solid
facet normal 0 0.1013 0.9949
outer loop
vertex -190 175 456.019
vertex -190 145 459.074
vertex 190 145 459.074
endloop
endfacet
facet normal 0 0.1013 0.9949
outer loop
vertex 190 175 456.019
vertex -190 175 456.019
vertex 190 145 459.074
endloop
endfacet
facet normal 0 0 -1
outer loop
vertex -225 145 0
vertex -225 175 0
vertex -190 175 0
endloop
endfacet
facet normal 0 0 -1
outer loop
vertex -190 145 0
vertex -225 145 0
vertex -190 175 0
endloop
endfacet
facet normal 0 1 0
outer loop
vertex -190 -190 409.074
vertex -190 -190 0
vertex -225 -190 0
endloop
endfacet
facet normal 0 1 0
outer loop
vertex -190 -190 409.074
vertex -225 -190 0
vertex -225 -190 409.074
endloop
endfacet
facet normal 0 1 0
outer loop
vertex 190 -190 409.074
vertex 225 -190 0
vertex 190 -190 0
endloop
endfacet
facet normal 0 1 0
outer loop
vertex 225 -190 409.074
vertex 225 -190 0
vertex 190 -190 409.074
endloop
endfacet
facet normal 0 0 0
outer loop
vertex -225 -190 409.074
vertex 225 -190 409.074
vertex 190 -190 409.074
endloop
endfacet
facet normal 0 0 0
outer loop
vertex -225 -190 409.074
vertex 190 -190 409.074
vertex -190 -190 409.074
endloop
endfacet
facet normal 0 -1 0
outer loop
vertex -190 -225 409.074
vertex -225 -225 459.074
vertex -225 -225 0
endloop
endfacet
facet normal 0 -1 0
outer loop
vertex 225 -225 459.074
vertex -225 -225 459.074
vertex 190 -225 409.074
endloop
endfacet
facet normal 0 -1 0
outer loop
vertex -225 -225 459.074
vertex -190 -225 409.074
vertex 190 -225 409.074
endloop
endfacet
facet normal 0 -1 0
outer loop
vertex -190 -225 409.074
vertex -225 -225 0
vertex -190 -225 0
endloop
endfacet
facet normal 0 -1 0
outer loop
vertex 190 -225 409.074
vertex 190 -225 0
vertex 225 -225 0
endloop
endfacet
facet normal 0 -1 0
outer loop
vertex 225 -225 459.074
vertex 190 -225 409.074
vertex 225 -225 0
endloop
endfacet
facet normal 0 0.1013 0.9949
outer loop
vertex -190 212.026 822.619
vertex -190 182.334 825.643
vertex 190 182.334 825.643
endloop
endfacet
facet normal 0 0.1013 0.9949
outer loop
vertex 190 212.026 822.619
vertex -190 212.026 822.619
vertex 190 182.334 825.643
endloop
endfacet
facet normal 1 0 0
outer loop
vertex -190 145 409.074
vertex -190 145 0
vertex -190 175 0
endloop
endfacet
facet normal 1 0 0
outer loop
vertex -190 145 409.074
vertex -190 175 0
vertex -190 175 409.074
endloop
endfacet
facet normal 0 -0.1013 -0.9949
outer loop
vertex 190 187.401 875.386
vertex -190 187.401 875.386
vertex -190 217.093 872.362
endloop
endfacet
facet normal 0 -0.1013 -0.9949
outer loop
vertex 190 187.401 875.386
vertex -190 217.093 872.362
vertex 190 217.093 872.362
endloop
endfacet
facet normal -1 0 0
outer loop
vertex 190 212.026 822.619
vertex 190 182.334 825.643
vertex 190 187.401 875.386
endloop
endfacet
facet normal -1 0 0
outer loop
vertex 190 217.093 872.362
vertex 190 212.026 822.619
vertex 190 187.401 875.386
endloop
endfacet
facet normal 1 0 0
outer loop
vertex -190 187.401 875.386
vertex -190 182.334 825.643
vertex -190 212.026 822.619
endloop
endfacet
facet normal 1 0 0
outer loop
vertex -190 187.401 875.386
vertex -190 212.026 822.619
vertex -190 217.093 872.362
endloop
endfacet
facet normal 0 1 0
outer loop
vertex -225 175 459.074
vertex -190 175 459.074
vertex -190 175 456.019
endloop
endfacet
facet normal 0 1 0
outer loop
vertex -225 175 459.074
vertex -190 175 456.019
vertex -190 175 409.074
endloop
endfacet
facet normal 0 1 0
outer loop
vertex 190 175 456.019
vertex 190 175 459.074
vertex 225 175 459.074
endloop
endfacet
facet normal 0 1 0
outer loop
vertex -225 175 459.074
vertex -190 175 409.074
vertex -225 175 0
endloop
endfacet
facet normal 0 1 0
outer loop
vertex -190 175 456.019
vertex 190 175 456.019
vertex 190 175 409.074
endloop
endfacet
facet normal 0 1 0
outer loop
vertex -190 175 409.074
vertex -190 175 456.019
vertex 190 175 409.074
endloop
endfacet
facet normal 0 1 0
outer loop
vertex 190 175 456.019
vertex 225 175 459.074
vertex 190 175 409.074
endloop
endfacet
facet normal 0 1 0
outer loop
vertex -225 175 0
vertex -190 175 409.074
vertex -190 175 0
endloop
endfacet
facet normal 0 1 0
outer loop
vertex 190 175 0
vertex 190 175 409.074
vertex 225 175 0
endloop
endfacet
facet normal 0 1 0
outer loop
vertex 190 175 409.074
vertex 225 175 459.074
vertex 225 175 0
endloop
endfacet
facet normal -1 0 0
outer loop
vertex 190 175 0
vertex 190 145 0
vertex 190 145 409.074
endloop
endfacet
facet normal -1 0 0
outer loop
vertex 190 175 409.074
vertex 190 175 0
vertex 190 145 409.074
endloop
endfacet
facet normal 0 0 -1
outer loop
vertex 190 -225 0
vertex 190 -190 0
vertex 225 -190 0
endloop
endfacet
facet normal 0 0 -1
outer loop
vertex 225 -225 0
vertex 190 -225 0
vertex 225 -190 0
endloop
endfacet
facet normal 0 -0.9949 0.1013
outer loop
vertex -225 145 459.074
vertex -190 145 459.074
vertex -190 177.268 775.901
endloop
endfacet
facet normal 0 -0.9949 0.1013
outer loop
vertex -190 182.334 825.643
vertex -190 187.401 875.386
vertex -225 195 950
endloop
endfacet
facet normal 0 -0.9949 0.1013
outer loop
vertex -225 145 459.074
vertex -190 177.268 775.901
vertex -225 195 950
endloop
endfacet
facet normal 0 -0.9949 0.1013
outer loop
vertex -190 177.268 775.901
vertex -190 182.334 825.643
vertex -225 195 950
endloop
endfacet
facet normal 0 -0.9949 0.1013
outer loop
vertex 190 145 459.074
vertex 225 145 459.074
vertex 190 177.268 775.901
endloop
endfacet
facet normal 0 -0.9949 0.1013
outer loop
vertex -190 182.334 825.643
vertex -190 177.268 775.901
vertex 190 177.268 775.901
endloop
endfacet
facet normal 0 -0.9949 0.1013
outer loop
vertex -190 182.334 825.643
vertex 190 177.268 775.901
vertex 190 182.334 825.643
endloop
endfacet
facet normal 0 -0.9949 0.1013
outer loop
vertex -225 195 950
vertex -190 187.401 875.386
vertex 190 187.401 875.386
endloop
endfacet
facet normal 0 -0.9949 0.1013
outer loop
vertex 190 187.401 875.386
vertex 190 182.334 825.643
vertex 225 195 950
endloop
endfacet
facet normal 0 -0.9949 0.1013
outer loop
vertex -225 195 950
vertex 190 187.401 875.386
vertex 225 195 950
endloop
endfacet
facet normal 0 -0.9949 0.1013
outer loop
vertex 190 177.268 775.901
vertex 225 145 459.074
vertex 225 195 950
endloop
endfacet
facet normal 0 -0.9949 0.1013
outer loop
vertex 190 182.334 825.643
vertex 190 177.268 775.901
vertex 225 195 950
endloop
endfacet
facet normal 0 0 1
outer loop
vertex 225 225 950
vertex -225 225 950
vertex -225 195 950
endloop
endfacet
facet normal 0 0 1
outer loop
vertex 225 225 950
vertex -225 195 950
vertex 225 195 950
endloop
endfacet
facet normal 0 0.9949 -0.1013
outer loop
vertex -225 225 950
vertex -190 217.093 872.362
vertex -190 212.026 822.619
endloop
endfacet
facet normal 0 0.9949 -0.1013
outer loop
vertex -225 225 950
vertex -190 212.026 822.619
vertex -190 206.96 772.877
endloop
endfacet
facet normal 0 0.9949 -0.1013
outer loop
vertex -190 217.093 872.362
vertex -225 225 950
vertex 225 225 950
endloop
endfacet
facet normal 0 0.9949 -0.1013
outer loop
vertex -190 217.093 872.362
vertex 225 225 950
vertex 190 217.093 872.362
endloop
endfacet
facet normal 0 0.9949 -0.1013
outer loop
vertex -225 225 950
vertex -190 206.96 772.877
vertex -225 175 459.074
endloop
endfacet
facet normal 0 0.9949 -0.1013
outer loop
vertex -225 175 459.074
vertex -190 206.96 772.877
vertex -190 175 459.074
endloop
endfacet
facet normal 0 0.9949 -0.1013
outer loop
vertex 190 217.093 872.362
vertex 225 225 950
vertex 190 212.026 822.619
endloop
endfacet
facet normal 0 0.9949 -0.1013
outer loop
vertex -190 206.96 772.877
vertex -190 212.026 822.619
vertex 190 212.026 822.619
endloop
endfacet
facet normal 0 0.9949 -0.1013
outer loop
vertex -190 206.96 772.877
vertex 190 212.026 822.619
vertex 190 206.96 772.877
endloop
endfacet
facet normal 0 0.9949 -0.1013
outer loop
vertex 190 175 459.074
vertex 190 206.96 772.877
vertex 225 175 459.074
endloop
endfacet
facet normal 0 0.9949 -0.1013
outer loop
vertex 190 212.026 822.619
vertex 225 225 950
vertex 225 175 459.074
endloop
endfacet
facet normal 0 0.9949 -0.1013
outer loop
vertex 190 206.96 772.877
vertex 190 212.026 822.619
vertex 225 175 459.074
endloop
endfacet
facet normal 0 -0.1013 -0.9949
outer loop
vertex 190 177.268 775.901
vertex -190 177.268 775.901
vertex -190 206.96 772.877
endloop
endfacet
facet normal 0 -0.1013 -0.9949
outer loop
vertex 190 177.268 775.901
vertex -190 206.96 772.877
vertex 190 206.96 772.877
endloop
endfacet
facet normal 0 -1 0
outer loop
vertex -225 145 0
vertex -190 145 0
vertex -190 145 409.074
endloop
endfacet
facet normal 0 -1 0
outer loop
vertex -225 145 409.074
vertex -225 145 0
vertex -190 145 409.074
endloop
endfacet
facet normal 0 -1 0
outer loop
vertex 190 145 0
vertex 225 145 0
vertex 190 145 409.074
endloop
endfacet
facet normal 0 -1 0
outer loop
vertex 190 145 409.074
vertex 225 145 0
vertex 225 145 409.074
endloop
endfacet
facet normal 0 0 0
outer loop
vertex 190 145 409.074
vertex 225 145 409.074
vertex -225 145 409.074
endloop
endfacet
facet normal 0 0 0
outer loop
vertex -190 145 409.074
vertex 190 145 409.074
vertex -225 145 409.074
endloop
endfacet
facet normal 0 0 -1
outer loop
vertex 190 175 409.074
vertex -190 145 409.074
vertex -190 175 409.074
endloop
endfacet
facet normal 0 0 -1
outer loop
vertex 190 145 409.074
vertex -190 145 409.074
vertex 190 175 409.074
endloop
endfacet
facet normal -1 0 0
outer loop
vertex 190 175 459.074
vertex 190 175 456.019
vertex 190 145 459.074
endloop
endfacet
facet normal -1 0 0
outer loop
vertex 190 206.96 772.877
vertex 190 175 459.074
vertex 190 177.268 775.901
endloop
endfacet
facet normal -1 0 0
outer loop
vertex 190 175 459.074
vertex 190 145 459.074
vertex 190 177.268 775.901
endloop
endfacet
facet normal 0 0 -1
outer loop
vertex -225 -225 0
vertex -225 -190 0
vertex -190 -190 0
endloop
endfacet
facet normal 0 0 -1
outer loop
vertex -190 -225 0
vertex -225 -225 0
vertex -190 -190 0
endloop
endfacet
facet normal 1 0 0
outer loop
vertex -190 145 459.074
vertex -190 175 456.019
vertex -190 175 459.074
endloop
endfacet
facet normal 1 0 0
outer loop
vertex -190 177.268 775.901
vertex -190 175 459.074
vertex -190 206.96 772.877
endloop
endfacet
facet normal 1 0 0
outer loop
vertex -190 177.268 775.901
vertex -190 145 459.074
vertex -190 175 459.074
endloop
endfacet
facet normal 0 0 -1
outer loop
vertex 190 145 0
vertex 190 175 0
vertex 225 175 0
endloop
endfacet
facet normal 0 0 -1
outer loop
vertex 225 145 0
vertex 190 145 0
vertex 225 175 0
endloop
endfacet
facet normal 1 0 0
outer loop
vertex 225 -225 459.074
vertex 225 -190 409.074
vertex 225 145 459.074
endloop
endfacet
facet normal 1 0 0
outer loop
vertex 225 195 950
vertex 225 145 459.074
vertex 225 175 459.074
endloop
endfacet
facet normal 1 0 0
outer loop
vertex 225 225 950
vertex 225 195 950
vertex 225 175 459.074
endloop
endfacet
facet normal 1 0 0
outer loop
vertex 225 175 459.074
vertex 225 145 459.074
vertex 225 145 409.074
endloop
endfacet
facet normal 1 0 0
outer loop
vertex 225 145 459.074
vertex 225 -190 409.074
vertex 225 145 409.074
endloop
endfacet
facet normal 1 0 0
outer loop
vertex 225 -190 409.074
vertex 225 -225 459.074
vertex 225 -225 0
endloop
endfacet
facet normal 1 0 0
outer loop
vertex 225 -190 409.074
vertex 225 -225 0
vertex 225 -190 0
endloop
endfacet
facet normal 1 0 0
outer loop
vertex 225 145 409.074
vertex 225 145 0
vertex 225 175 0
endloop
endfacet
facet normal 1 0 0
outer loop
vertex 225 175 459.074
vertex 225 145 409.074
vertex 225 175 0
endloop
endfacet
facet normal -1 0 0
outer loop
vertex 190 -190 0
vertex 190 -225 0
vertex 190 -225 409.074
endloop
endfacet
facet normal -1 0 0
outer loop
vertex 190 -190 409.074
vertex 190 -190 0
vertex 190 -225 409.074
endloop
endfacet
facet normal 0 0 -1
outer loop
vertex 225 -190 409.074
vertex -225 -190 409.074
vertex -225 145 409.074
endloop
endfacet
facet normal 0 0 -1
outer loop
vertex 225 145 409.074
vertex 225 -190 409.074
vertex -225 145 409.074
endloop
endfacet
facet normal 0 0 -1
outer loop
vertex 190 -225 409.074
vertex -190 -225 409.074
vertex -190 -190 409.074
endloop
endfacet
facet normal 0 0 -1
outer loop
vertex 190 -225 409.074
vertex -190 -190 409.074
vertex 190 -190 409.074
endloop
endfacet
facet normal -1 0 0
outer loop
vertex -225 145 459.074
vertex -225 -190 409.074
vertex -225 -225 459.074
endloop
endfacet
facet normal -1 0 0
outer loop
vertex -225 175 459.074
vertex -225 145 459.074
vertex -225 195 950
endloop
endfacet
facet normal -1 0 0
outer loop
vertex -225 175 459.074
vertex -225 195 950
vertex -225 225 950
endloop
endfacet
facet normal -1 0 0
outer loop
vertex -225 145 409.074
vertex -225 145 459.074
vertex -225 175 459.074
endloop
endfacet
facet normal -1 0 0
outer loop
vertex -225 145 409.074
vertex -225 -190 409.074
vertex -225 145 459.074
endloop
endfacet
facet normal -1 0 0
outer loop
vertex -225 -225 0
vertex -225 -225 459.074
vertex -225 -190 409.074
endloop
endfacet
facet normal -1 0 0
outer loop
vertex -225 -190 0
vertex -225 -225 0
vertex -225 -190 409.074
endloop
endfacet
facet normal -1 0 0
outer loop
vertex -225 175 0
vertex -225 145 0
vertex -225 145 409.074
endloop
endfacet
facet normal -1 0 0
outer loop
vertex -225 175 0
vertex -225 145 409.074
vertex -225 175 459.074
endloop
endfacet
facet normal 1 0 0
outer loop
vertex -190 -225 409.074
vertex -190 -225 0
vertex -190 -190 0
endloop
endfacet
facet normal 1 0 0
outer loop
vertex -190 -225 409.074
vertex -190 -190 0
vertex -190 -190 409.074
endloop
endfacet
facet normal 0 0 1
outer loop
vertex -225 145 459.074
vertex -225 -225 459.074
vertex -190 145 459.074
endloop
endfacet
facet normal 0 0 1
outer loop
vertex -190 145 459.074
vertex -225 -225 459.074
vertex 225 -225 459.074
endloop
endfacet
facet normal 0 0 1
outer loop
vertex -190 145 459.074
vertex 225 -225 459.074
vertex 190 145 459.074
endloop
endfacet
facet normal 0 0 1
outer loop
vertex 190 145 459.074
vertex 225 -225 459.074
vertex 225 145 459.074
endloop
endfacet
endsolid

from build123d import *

# Parameters (mm, degrees)
F0_W     = 450
F0_H     = 450
F1_DEPTH = 950
F2_W     = 50
F2_H     = 409.0744554996
F2_W_2   = 335
F2_H_2   = 50
F3_DEPTH = 450.001
F4_W     = 380
F4_H     = 409.074
F5_DEPTH = 450.001
F6_W     = 380
F6_H     = 50
F6_H_2   = 318.4651864549
F7_DEPTH = 126.1046604873


with BuildPart() as f1:
    # F0 (on Top) → F1 (new body)
    with BuildSketch(Plane.XY):
        Rectangle(F0_W, F0_H)
    extrude(amount=F1_DEPTH)

    # F2 (on face) → F3 (cut, through all)
    with BuildSketch(Plane.YZ.offset(225)):
        Polygon((225, 950), (175, 459.0744554996), (225, 459.0744554996), align=None)
        Polygon((-225, 950), (-225, 459.0744554996), (145, 459.0744554996), (195, 950), align=None)
        with Locations((200, 204.5372277498)):
            Rectangle(F2_W, F2_H)
        with Locations((-22.5, 204.5372277498)):
            Rectangle(F2_W_2, F2_H)
        with Locations((200, 434.0744554996)):
            Rectangle(F2_W, F2_H_2)
    extrude(amount=-F3_DEPTH, mode=Mode.SUBTRACT)

    # F4 (on face) → F5 (cut, through all)
    with BuildSketch(Plane.XZ.offset(225)):
        with Locations((0, 204.537)):
            Rectangle(F4_W, F4_H)
    extrude(amount=-F5_DEPTH, mode=Mode.SUBTRACT)

    # F6 (on face) → F7 (cut, through all)
    with BuildSketch(Plane(origin=(0, 97.2353512241, -9.903268664), x_dir=(1, 0, 0), z_dir=(0, -0.9948534526, 0.1013242704))):
        with Locations((0, 864.869012738)):
            Rectangle(F6_W, F6_H)
        with Locations((0, 630.6364195106)):
            Rectangle(F6_W, F6_H_2)
    extrude(amount=-F7_DEPTH, mode=Mode.SUBTRACT)


solid = f1.part
